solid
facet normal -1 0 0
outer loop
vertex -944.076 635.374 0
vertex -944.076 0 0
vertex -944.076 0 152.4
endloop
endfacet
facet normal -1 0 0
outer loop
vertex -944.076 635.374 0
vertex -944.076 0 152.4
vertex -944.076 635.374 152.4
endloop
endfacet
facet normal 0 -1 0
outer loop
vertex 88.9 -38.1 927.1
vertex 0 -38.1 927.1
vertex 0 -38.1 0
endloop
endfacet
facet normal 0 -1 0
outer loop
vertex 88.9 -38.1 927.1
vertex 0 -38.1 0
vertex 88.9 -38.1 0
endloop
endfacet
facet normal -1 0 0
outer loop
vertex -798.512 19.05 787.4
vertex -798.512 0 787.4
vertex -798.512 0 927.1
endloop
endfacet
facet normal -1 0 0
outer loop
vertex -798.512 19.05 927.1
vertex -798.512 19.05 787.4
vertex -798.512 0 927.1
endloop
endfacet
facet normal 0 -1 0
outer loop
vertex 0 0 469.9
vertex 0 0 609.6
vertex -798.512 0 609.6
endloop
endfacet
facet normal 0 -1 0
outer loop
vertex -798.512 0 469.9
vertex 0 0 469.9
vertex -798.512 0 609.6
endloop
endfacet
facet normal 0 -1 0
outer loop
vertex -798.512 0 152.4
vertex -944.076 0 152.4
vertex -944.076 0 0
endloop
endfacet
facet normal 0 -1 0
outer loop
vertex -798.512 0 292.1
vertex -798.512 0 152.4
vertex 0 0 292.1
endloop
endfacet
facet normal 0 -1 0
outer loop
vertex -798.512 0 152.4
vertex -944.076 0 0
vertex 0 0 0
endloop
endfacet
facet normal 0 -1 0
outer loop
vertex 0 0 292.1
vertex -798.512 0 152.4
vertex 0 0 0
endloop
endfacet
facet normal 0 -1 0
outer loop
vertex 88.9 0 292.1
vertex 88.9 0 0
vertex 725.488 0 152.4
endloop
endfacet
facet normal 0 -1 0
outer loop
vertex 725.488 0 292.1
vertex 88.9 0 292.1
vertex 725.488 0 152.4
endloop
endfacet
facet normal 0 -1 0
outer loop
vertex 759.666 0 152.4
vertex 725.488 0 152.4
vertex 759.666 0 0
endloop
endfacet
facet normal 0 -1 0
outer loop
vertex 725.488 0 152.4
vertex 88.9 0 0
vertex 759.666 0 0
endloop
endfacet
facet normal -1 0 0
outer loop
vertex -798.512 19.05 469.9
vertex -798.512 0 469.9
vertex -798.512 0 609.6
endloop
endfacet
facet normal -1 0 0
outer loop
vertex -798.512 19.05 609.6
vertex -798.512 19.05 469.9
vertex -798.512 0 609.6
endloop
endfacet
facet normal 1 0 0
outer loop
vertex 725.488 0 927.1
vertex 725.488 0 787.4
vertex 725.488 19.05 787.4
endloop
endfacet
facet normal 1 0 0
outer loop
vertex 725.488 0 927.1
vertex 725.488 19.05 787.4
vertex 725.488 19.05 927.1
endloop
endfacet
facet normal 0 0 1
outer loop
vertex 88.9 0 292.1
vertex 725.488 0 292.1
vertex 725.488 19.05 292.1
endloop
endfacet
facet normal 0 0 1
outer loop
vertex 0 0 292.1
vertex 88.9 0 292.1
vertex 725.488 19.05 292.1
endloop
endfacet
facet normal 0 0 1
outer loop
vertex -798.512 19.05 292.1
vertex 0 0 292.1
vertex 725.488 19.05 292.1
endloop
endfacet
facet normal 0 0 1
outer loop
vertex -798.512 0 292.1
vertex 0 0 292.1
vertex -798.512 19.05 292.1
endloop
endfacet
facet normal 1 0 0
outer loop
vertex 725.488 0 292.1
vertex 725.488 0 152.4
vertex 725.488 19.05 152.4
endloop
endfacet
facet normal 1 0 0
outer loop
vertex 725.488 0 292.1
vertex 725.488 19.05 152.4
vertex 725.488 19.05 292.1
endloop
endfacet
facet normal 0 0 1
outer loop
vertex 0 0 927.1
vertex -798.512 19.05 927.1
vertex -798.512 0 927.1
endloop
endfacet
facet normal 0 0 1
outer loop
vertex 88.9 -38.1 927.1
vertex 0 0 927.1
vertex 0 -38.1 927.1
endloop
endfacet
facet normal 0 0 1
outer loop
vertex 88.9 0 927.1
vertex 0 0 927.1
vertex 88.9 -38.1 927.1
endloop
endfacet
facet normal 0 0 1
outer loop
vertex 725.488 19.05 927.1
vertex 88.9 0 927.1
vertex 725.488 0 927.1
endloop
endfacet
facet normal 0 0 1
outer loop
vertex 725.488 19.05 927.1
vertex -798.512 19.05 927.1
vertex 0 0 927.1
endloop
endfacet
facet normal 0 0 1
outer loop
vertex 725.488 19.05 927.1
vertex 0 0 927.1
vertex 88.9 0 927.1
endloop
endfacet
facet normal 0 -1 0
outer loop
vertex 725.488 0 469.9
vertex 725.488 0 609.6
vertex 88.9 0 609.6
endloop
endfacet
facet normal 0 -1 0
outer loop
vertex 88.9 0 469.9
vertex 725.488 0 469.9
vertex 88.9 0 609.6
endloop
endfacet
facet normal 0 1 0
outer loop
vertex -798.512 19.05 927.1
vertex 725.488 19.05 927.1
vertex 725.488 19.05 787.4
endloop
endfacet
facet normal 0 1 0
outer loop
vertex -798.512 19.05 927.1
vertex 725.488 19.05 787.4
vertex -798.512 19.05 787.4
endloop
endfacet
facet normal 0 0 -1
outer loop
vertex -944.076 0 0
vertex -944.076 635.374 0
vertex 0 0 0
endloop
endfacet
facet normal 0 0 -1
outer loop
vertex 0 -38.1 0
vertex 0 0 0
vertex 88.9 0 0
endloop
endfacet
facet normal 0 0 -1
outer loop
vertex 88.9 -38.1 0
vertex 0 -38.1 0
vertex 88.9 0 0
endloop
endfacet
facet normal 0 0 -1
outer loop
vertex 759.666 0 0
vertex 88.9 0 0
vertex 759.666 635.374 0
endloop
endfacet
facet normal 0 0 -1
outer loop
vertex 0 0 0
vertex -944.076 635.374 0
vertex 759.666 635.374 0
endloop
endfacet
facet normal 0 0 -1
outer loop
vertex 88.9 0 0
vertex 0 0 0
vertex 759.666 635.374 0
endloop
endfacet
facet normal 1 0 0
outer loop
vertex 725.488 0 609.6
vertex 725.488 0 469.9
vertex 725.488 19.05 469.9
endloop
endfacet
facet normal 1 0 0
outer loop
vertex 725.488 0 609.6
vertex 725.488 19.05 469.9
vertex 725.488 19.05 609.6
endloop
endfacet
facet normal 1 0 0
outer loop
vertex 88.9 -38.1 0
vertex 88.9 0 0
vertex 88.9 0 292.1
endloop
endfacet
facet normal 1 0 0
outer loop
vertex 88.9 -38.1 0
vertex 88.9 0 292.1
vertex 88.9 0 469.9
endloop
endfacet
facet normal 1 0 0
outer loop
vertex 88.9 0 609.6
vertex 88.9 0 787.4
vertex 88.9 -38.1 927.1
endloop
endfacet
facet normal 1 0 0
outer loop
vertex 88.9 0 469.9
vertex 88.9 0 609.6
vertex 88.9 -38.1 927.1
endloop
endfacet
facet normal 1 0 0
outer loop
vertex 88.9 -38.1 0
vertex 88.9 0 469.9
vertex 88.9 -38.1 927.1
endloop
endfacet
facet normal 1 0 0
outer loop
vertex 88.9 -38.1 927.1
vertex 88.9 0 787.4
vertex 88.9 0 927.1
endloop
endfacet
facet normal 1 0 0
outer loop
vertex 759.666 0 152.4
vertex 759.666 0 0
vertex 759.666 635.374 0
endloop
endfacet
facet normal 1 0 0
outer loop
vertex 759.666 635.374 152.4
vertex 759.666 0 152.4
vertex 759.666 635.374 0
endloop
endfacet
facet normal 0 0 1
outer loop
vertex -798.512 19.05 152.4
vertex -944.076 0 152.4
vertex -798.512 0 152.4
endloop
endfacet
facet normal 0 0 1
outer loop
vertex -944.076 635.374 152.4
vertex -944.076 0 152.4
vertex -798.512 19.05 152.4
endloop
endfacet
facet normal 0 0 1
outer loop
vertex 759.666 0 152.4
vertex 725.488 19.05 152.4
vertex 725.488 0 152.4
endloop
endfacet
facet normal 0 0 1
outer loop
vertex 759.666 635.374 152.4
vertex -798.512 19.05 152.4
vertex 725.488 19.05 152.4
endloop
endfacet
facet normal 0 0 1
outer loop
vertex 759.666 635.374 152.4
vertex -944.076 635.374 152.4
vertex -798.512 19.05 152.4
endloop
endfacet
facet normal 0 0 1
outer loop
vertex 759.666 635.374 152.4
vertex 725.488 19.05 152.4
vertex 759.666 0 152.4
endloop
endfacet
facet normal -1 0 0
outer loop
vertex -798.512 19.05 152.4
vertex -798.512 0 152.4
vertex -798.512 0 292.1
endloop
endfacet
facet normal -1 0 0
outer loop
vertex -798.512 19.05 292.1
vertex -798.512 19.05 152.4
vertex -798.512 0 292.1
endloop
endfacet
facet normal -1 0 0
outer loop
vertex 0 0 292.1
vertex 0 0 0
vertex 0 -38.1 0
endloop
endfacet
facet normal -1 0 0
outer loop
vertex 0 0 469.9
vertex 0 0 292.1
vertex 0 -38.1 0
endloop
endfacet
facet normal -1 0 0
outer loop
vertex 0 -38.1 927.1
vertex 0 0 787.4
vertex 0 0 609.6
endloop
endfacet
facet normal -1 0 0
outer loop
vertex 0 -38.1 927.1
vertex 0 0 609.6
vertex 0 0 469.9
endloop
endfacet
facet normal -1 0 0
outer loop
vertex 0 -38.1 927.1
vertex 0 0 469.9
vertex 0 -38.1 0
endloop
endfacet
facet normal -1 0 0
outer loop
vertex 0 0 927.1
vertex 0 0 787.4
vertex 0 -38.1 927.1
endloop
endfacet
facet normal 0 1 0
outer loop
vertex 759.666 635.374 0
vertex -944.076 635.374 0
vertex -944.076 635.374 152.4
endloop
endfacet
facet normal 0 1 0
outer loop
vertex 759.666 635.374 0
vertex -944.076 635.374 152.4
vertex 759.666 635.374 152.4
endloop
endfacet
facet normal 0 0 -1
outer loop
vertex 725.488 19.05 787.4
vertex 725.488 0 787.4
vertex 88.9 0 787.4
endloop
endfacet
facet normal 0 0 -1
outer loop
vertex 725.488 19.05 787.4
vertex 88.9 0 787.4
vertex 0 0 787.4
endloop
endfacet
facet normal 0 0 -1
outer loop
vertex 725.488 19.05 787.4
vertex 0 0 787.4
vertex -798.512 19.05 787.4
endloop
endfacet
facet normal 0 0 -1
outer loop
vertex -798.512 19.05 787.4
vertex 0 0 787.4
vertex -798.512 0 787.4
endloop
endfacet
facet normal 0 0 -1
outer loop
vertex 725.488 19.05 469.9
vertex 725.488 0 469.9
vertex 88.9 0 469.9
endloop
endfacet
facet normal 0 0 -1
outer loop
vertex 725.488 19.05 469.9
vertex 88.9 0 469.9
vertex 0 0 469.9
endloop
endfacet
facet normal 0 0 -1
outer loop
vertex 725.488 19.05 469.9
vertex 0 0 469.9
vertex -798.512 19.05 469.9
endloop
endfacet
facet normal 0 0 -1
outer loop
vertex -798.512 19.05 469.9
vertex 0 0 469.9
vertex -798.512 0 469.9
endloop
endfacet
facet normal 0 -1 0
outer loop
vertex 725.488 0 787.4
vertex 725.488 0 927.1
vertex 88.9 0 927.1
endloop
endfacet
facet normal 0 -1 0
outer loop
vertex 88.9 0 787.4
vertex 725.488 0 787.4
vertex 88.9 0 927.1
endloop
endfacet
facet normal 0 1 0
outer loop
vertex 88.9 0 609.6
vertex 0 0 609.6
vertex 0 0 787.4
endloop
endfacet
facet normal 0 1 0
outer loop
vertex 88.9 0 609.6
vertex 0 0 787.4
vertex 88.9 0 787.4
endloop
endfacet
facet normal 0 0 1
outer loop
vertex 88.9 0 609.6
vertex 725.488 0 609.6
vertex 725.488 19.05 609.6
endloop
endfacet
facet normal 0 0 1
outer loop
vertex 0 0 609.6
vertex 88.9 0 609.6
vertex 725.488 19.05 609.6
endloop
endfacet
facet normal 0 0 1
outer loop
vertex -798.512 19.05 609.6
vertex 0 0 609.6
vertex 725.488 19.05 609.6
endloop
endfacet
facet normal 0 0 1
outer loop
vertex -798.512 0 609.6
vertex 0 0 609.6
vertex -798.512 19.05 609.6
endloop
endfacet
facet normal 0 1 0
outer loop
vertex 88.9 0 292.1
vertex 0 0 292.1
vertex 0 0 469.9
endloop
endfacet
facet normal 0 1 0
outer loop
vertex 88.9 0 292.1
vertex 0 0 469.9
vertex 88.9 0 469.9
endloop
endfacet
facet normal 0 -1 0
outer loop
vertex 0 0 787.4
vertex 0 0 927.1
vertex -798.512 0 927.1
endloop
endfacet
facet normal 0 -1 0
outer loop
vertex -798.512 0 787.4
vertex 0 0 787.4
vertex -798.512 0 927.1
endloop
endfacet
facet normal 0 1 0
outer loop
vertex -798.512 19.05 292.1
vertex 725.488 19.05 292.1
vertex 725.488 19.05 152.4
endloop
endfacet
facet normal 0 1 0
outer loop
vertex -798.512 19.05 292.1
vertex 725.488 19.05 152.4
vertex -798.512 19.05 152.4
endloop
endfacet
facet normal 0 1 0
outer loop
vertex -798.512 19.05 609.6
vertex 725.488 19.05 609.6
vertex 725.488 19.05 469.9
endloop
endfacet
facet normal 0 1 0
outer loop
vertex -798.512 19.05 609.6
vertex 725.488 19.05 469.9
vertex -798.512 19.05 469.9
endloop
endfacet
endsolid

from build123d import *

# Parameters (mm, degrees)
F0_W     = 88.9
F0_H     = 927.1
F1_DEPTH = 38.1
F2_W     = 1524
F2_H     = 139.7
F3_DEPTH = 19.05
F4_W     = 1703.7423849106
F4_H     = 635.3735253215
F5_DEPTH = 152.4


with BuildPart() as f1:
    # F0 (on Front) → F1 (new body)
    with BuildSketch(Plane.XZ):
        with Locations((44.45, 463.55)):
            Rectangle(F0_W, F0_H)
    extrude(amount=F1_DEPTH)

    # F2 (on face) → F3 (join)
    with BuildSketch(Plane(origin=(0, 0, 0), x_dir=(-1, 0, 0), z_dir=(0, 1, 0))):
        with Locations((36.5120689366, 222.25)):
            Rectangle(F2_W, F2_H)
        with Locations((36.5120689366, 539.75)):
            Rectangle(F2_W, F2_H)
        with Locations((36.5120689366, 857.25)):
            Rectangle(F2_W, F2_H)
    extrude(amount=F3_DEPTH)

    # F4 (on Top) → F5 (join)
    with BuildSketch(Plane.XY):
        with Locations((-92.205286026, 317.6867626607)):
            Rectangle(F4_W, F4_H)
    extrude(amount=F5_DEPTH)


solid = f1.part
